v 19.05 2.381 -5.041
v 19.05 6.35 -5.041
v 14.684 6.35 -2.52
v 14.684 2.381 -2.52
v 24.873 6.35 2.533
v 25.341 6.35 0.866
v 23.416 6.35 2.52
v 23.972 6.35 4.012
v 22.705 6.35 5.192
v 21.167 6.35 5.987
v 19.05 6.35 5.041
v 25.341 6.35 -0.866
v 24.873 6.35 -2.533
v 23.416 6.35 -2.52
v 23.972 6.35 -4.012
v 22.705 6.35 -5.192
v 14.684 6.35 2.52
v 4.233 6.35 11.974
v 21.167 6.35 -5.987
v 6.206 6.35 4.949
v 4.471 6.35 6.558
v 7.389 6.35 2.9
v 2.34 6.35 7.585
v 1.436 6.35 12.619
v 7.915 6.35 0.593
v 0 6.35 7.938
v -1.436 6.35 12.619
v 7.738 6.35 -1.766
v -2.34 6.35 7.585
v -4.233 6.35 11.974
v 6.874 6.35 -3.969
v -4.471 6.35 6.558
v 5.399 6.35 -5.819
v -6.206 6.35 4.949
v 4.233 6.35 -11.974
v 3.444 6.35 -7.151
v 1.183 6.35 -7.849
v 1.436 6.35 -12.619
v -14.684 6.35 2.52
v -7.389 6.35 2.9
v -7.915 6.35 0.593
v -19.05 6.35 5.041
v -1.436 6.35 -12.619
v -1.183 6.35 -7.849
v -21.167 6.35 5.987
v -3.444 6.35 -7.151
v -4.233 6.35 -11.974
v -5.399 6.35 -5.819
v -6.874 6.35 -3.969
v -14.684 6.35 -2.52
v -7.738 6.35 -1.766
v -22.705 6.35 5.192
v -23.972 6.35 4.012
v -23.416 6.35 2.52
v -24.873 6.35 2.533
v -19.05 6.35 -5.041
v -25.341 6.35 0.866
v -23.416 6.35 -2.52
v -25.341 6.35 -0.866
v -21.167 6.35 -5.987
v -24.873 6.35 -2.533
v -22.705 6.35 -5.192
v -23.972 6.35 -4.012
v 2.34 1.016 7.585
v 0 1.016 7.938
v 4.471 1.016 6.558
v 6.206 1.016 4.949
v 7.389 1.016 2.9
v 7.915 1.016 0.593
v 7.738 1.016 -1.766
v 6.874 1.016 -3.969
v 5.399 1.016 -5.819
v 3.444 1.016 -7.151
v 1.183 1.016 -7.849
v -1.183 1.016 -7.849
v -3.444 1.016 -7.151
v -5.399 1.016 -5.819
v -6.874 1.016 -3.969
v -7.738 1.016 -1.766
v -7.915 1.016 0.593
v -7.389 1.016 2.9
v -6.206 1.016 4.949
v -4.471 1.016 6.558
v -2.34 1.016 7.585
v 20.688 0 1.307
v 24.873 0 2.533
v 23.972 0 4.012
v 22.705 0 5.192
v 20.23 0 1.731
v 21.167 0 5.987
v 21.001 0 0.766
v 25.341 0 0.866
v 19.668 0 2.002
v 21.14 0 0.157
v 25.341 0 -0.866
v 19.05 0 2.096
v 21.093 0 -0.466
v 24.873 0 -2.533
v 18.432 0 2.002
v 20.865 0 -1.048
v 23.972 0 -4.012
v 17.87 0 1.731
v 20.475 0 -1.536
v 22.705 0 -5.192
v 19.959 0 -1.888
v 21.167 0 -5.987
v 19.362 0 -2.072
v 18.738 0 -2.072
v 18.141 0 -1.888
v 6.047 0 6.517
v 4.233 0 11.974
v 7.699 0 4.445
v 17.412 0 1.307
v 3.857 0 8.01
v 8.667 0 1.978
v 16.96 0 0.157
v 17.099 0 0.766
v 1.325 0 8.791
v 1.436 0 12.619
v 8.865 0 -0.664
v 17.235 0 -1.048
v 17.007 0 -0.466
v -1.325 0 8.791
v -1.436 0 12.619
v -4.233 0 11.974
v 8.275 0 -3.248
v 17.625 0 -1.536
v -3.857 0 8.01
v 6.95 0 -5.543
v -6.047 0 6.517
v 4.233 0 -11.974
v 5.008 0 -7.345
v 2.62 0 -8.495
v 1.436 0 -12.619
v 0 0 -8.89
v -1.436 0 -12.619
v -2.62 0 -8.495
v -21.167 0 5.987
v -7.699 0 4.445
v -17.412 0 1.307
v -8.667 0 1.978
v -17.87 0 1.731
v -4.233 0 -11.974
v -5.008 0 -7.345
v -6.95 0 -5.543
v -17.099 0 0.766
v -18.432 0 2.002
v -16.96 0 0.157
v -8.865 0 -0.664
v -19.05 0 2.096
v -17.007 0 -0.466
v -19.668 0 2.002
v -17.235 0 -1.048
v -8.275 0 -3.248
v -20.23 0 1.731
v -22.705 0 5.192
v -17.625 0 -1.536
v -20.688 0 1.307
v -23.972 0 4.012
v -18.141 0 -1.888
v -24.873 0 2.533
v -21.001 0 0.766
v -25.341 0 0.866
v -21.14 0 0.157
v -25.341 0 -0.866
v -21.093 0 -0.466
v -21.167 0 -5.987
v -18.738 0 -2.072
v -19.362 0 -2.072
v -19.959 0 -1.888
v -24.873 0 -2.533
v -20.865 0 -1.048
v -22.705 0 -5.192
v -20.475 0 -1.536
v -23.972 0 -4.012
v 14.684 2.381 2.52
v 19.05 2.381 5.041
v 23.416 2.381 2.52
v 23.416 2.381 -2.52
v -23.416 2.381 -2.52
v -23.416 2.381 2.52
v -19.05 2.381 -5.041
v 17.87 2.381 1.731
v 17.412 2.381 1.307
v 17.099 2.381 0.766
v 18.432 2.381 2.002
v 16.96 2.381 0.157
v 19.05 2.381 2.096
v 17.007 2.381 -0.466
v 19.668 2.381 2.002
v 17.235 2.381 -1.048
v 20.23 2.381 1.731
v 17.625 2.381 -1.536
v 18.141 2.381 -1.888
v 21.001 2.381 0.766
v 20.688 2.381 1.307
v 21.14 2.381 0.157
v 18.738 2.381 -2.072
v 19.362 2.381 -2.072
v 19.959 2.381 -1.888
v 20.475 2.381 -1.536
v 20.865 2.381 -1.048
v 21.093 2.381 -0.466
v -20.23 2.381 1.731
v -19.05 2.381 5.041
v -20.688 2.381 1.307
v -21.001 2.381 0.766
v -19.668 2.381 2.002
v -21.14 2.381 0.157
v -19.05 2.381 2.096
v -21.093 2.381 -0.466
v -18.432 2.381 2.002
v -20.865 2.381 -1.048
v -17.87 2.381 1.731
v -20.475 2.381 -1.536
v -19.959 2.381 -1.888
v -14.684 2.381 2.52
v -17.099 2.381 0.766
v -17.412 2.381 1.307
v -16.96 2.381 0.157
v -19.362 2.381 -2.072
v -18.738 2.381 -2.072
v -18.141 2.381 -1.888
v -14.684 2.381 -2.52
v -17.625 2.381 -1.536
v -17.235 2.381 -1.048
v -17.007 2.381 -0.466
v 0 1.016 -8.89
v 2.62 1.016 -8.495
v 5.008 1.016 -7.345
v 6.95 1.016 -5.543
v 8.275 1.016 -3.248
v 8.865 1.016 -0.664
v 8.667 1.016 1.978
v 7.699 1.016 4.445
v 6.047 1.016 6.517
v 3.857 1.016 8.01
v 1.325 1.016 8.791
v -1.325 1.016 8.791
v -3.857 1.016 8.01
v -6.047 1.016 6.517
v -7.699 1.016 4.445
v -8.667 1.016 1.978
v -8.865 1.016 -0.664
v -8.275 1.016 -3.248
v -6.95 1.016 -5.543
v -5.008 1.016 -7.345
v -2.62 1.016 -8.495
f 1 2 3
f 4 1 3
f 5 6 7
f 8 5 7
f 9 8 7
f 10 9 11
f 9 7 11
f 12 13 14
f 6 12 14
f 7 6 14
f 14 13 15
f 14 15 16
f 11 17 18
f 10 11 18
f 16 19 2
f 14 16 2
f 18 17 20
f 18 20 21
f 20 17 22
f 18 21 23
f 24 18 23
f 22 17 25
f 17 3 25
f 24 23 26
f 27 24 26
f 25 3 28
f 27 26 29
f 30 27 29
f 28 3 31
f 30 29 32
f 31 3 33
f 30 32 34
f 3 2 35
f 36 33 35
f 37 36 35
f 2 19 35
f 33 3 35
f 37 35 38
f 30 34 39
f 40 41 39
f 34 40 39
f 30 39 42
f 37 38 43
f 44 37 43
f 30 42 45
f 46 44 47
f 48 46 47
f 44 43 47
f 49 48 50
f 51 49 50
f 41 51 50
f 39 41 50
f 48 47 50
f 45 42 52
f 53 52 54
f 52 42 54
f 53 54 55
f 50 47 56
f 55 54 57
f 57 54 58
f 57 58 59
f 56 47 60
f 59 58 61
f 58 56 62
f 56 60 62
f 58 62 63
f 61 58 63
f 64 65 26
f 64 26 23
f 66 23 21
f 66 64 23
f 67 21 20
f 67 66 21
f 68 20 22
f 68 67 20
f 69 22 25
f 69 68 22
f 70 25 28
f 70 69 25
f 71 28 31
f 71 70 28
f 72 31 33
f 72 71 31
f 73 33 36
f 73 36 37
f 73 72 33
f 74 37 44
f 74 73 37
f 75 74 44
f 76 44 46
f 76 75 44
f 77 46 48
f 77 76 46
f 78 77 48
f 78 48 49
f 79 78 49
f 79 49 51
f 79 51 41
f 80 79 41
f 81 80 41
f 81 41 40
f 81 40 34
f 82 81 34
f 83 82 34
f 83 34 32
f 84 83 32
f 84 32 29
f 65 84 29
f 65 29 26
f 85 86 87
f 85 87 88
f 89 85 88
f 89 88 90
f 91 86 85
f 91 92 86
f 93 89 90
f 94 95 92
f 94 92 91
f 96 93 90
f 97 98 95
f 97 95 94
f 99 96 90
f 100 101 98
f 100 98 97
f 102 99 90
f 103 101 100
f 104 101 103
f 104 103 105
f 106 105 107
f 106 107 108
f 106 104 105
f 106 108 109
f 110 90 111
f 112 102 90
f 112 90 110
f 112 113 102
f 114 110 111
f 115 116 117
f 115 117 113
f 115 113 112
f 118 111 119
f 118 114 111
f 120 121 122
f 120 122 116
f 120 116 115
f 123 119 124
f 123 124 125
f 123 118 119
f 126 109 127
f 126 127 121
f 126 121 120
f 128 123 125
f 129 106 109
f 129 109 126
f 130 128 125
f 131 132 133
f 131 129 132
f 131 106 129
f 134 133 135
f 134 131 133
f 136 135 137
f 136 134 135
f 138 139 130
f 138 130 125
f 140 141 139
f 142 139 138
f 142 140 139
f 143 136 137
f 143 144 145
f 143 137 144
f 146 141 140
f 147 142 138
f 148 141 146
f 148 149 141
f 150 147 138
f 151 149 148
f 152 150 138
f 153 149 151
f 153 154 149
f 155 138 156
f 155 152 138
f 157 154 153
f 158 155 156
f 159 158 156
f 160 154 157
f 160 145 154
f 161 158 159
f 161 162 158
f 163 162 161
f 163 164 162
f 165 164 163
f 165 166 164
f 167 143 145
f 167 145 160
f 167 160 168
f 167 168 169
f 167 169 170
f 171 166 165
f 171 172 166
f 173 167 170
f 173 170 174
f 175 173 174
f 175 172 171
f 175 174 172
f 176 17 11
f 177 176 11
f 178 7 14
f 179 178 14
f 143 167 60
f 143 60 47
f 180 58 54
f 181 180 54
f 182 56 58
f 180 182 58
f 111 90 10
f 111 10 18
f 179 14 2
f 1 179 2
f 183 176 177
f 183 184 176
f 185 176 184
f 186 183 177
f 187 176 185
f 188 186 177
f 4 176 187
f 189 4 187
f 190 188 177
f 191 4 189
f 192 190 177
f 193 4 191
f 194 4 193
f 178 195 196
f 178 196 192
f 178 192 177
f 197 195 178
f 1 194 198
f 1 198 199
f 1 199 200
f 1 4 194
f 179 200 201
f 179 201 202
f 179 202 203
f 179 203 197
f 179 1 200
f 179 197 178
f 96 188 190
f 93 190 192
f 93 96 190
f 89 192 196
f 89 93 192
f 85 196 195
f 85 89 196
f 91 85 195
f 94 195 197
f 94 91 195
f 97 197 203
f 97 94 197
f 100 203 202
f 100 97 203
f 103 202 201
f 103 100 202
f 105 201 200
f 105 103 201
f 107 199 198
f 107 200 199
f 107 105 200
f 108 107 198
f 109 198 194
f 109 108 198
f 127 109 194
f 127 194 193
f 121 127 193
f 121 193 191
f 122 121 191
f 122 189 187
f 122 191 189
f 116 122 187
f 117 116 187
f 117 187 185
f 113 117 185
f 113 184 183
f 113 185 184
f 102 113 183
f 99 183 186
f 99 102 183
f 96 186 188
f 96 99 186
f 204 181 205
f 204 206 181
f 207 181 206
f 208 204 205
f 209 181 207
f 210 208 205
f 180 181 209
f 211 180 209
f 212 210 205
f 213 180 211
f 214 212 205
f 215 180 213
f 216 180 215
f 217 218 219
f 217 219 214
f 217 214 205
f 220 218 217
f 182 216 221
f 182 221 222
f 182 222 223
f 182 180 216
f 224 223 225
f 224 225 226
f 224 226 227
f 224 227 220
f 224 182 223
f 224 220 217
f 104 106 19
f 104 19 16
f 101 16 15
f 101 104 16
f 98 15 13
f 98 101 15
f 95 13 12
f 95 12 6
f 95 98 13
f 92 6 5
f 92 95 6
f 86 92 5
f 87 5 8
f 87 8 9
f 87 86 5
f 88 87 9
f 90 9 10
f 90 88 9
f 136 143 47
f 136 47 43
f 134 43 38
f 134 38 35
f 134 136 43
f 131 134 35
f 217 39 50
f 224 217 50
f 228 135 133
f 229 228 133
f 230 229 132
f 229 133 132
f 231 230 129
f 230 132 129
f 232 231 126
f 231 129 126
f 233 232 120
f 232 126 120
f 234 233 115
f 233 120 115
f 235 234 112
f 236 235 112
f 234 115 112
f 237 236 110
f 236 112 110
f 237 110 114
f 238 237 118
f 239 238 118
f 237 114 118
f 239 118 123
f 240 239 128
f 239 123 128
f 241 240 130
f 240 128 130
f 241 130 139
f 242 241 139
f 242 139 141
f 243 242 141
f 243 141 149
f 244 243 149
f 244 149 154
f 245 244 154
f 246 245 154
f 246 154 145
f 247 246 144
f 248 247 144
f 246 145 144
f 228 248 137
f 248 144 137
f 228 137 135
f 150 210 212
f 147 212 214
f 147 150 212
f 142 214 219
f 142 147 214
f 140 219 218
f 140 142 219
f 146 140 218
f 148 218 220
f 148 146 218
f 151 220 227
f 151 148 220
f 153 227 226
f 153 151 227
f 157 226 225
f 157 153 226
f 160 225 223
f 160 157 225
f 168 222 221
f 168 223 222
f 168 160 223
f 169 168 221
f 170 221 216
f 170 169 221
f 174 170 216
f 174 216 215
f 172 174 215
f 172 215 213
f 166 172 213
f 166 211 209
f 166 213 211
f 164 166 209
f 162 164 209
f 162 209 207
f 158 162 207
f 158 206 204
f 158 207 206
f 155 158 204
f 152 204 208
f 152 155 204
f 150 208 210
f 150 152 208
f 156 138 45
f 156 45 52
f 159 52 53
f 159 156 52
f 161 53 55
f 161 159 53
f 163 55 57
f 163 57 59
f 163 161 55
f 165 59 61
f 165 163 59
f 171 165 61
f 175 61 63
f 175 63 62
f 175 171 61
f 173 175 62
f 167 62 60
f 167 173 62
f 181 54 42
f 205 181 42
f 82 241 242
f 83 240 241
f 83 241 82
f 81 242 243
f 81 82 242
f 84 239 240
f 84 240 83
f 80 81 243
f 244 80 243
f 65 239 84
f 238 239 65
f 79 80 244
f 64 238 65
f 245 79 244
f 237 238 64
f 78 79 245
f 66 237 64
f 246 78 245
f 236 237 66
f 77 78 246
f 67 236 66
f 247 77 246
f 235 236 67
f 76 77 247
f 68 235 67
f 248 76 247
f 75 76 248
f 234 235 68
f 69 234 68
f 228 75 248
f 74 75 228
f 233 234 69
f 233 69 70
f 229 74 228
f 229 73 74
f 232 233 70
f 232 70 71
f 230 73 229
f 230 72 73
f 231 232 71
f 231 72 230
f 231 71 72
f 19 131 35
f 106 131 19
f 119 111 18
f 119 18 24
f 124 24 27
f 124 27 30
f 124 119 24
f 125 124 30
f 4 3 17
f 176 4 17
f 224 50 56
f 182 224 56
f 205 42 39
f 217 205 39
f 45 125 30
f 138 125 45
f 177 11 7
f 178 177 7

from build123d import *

# Parameters (mm, degrees)
SKETCH1_R           = 7.9375
SKETCH1_R_2         = 2.0955
WHOLE_PART_DEPTH    = 6.35
SKETCH2_R           = 8.89
BEARING_DEPTH_DEPTH = 1.016
NUT_POCKET_DEPTH    = 3.96875


with BuildPart() as part:
    # Sketch1 → whole-part (new body)
    with BuildSketch(Plane(origin=(0, 0, 0), x_dir=(1, 0, 0), z_dir=(0, 1, 0))):
        with BuildLine():
            Line((-21.166666667, 5.986837414), (-4.233333333, 11.973674828))
            ThreePointArc((-4.233333333, 11.973674828), (0, 12.7), (4.233333333, 11.973674828))
            Line((4.233333333, 11.973674828), (21.166666667, 5.986837414))
            ThreePointArc((21.166666667, 5.986837414), (25.4, 0), (21.166666667, -5.986837414))
            Line((21.166666667, -5.986837414), (4.233333333, -11.973674828))
            ThreePointArc((4.233333333, -11.973674828), (0, -12.7), (-4.233333333, -11.973674828))
            Line((-4.233333333, -11.973674828), (-21.166666667, -5.986837414))
            ThreePointArc((-21.166666667, -5.986837414), (-25.4, 0), (-21.166666667, 5.986837414))
        make_face()
        with Locations(Location((0, 0, 0), (0, 0, 270))):
            Circle(SKETCH1_R, mode=Mode.SUBTRACT)
        with Locations(Location((-19.05, 0, 0), (0, 0, 270))):
            Circle(SKETCH1_R_2, mode=Mode.SUBTRACT)
        with Locations(Location((19.05, 0, 0), (0, 0, 270))):
            Circle(SKETCH1_R_2, mode=Mode.SUBTRACT)
    extrude(amount=WHOLE_PART_DEPTH)

    # Sketch2 → bearing-depth (cut)
    with BuildSketch(Plane(origin=(0, 0, 0), x_dir=(-1, 0, 0), z_dir=(0, -1, 0))):
        with Locations(Location((0, 0, 0), (0, 0, 90))):
            Circle(SKETCH2_R)
    extrude(amount=-BEARING_DEPTH_DEPTH, mode=Mode.SUBTRACT)

    # Sketch3 → nut-pocket (cut)
    with BuildSketch(Plane(origin=(0, 6.35, 0), x_dir=(1, 0, 0), z_dir=(0, 1, 0))):
        Polygon((-23.415625, 2.520494769), (-23.415625, -2.520494769), (-19.05, -5.040989538), (-14.684375, -2.520494769), (-14.684375, 2.520494769), (-19.05, 5.040989538), align=None)
        Polygon((19.05, 5.040989538), (14.684375, 2.520494769), (14.684375, -2.520494769), (19.05, -5.040989538), (23.415625, -2.520494769), (23.415625, 2.520494769), align=None)
    extrude(amount=-NUT_POCKET_DEPTH, mode=Mode.SUBTRACT)


solid = part.part
